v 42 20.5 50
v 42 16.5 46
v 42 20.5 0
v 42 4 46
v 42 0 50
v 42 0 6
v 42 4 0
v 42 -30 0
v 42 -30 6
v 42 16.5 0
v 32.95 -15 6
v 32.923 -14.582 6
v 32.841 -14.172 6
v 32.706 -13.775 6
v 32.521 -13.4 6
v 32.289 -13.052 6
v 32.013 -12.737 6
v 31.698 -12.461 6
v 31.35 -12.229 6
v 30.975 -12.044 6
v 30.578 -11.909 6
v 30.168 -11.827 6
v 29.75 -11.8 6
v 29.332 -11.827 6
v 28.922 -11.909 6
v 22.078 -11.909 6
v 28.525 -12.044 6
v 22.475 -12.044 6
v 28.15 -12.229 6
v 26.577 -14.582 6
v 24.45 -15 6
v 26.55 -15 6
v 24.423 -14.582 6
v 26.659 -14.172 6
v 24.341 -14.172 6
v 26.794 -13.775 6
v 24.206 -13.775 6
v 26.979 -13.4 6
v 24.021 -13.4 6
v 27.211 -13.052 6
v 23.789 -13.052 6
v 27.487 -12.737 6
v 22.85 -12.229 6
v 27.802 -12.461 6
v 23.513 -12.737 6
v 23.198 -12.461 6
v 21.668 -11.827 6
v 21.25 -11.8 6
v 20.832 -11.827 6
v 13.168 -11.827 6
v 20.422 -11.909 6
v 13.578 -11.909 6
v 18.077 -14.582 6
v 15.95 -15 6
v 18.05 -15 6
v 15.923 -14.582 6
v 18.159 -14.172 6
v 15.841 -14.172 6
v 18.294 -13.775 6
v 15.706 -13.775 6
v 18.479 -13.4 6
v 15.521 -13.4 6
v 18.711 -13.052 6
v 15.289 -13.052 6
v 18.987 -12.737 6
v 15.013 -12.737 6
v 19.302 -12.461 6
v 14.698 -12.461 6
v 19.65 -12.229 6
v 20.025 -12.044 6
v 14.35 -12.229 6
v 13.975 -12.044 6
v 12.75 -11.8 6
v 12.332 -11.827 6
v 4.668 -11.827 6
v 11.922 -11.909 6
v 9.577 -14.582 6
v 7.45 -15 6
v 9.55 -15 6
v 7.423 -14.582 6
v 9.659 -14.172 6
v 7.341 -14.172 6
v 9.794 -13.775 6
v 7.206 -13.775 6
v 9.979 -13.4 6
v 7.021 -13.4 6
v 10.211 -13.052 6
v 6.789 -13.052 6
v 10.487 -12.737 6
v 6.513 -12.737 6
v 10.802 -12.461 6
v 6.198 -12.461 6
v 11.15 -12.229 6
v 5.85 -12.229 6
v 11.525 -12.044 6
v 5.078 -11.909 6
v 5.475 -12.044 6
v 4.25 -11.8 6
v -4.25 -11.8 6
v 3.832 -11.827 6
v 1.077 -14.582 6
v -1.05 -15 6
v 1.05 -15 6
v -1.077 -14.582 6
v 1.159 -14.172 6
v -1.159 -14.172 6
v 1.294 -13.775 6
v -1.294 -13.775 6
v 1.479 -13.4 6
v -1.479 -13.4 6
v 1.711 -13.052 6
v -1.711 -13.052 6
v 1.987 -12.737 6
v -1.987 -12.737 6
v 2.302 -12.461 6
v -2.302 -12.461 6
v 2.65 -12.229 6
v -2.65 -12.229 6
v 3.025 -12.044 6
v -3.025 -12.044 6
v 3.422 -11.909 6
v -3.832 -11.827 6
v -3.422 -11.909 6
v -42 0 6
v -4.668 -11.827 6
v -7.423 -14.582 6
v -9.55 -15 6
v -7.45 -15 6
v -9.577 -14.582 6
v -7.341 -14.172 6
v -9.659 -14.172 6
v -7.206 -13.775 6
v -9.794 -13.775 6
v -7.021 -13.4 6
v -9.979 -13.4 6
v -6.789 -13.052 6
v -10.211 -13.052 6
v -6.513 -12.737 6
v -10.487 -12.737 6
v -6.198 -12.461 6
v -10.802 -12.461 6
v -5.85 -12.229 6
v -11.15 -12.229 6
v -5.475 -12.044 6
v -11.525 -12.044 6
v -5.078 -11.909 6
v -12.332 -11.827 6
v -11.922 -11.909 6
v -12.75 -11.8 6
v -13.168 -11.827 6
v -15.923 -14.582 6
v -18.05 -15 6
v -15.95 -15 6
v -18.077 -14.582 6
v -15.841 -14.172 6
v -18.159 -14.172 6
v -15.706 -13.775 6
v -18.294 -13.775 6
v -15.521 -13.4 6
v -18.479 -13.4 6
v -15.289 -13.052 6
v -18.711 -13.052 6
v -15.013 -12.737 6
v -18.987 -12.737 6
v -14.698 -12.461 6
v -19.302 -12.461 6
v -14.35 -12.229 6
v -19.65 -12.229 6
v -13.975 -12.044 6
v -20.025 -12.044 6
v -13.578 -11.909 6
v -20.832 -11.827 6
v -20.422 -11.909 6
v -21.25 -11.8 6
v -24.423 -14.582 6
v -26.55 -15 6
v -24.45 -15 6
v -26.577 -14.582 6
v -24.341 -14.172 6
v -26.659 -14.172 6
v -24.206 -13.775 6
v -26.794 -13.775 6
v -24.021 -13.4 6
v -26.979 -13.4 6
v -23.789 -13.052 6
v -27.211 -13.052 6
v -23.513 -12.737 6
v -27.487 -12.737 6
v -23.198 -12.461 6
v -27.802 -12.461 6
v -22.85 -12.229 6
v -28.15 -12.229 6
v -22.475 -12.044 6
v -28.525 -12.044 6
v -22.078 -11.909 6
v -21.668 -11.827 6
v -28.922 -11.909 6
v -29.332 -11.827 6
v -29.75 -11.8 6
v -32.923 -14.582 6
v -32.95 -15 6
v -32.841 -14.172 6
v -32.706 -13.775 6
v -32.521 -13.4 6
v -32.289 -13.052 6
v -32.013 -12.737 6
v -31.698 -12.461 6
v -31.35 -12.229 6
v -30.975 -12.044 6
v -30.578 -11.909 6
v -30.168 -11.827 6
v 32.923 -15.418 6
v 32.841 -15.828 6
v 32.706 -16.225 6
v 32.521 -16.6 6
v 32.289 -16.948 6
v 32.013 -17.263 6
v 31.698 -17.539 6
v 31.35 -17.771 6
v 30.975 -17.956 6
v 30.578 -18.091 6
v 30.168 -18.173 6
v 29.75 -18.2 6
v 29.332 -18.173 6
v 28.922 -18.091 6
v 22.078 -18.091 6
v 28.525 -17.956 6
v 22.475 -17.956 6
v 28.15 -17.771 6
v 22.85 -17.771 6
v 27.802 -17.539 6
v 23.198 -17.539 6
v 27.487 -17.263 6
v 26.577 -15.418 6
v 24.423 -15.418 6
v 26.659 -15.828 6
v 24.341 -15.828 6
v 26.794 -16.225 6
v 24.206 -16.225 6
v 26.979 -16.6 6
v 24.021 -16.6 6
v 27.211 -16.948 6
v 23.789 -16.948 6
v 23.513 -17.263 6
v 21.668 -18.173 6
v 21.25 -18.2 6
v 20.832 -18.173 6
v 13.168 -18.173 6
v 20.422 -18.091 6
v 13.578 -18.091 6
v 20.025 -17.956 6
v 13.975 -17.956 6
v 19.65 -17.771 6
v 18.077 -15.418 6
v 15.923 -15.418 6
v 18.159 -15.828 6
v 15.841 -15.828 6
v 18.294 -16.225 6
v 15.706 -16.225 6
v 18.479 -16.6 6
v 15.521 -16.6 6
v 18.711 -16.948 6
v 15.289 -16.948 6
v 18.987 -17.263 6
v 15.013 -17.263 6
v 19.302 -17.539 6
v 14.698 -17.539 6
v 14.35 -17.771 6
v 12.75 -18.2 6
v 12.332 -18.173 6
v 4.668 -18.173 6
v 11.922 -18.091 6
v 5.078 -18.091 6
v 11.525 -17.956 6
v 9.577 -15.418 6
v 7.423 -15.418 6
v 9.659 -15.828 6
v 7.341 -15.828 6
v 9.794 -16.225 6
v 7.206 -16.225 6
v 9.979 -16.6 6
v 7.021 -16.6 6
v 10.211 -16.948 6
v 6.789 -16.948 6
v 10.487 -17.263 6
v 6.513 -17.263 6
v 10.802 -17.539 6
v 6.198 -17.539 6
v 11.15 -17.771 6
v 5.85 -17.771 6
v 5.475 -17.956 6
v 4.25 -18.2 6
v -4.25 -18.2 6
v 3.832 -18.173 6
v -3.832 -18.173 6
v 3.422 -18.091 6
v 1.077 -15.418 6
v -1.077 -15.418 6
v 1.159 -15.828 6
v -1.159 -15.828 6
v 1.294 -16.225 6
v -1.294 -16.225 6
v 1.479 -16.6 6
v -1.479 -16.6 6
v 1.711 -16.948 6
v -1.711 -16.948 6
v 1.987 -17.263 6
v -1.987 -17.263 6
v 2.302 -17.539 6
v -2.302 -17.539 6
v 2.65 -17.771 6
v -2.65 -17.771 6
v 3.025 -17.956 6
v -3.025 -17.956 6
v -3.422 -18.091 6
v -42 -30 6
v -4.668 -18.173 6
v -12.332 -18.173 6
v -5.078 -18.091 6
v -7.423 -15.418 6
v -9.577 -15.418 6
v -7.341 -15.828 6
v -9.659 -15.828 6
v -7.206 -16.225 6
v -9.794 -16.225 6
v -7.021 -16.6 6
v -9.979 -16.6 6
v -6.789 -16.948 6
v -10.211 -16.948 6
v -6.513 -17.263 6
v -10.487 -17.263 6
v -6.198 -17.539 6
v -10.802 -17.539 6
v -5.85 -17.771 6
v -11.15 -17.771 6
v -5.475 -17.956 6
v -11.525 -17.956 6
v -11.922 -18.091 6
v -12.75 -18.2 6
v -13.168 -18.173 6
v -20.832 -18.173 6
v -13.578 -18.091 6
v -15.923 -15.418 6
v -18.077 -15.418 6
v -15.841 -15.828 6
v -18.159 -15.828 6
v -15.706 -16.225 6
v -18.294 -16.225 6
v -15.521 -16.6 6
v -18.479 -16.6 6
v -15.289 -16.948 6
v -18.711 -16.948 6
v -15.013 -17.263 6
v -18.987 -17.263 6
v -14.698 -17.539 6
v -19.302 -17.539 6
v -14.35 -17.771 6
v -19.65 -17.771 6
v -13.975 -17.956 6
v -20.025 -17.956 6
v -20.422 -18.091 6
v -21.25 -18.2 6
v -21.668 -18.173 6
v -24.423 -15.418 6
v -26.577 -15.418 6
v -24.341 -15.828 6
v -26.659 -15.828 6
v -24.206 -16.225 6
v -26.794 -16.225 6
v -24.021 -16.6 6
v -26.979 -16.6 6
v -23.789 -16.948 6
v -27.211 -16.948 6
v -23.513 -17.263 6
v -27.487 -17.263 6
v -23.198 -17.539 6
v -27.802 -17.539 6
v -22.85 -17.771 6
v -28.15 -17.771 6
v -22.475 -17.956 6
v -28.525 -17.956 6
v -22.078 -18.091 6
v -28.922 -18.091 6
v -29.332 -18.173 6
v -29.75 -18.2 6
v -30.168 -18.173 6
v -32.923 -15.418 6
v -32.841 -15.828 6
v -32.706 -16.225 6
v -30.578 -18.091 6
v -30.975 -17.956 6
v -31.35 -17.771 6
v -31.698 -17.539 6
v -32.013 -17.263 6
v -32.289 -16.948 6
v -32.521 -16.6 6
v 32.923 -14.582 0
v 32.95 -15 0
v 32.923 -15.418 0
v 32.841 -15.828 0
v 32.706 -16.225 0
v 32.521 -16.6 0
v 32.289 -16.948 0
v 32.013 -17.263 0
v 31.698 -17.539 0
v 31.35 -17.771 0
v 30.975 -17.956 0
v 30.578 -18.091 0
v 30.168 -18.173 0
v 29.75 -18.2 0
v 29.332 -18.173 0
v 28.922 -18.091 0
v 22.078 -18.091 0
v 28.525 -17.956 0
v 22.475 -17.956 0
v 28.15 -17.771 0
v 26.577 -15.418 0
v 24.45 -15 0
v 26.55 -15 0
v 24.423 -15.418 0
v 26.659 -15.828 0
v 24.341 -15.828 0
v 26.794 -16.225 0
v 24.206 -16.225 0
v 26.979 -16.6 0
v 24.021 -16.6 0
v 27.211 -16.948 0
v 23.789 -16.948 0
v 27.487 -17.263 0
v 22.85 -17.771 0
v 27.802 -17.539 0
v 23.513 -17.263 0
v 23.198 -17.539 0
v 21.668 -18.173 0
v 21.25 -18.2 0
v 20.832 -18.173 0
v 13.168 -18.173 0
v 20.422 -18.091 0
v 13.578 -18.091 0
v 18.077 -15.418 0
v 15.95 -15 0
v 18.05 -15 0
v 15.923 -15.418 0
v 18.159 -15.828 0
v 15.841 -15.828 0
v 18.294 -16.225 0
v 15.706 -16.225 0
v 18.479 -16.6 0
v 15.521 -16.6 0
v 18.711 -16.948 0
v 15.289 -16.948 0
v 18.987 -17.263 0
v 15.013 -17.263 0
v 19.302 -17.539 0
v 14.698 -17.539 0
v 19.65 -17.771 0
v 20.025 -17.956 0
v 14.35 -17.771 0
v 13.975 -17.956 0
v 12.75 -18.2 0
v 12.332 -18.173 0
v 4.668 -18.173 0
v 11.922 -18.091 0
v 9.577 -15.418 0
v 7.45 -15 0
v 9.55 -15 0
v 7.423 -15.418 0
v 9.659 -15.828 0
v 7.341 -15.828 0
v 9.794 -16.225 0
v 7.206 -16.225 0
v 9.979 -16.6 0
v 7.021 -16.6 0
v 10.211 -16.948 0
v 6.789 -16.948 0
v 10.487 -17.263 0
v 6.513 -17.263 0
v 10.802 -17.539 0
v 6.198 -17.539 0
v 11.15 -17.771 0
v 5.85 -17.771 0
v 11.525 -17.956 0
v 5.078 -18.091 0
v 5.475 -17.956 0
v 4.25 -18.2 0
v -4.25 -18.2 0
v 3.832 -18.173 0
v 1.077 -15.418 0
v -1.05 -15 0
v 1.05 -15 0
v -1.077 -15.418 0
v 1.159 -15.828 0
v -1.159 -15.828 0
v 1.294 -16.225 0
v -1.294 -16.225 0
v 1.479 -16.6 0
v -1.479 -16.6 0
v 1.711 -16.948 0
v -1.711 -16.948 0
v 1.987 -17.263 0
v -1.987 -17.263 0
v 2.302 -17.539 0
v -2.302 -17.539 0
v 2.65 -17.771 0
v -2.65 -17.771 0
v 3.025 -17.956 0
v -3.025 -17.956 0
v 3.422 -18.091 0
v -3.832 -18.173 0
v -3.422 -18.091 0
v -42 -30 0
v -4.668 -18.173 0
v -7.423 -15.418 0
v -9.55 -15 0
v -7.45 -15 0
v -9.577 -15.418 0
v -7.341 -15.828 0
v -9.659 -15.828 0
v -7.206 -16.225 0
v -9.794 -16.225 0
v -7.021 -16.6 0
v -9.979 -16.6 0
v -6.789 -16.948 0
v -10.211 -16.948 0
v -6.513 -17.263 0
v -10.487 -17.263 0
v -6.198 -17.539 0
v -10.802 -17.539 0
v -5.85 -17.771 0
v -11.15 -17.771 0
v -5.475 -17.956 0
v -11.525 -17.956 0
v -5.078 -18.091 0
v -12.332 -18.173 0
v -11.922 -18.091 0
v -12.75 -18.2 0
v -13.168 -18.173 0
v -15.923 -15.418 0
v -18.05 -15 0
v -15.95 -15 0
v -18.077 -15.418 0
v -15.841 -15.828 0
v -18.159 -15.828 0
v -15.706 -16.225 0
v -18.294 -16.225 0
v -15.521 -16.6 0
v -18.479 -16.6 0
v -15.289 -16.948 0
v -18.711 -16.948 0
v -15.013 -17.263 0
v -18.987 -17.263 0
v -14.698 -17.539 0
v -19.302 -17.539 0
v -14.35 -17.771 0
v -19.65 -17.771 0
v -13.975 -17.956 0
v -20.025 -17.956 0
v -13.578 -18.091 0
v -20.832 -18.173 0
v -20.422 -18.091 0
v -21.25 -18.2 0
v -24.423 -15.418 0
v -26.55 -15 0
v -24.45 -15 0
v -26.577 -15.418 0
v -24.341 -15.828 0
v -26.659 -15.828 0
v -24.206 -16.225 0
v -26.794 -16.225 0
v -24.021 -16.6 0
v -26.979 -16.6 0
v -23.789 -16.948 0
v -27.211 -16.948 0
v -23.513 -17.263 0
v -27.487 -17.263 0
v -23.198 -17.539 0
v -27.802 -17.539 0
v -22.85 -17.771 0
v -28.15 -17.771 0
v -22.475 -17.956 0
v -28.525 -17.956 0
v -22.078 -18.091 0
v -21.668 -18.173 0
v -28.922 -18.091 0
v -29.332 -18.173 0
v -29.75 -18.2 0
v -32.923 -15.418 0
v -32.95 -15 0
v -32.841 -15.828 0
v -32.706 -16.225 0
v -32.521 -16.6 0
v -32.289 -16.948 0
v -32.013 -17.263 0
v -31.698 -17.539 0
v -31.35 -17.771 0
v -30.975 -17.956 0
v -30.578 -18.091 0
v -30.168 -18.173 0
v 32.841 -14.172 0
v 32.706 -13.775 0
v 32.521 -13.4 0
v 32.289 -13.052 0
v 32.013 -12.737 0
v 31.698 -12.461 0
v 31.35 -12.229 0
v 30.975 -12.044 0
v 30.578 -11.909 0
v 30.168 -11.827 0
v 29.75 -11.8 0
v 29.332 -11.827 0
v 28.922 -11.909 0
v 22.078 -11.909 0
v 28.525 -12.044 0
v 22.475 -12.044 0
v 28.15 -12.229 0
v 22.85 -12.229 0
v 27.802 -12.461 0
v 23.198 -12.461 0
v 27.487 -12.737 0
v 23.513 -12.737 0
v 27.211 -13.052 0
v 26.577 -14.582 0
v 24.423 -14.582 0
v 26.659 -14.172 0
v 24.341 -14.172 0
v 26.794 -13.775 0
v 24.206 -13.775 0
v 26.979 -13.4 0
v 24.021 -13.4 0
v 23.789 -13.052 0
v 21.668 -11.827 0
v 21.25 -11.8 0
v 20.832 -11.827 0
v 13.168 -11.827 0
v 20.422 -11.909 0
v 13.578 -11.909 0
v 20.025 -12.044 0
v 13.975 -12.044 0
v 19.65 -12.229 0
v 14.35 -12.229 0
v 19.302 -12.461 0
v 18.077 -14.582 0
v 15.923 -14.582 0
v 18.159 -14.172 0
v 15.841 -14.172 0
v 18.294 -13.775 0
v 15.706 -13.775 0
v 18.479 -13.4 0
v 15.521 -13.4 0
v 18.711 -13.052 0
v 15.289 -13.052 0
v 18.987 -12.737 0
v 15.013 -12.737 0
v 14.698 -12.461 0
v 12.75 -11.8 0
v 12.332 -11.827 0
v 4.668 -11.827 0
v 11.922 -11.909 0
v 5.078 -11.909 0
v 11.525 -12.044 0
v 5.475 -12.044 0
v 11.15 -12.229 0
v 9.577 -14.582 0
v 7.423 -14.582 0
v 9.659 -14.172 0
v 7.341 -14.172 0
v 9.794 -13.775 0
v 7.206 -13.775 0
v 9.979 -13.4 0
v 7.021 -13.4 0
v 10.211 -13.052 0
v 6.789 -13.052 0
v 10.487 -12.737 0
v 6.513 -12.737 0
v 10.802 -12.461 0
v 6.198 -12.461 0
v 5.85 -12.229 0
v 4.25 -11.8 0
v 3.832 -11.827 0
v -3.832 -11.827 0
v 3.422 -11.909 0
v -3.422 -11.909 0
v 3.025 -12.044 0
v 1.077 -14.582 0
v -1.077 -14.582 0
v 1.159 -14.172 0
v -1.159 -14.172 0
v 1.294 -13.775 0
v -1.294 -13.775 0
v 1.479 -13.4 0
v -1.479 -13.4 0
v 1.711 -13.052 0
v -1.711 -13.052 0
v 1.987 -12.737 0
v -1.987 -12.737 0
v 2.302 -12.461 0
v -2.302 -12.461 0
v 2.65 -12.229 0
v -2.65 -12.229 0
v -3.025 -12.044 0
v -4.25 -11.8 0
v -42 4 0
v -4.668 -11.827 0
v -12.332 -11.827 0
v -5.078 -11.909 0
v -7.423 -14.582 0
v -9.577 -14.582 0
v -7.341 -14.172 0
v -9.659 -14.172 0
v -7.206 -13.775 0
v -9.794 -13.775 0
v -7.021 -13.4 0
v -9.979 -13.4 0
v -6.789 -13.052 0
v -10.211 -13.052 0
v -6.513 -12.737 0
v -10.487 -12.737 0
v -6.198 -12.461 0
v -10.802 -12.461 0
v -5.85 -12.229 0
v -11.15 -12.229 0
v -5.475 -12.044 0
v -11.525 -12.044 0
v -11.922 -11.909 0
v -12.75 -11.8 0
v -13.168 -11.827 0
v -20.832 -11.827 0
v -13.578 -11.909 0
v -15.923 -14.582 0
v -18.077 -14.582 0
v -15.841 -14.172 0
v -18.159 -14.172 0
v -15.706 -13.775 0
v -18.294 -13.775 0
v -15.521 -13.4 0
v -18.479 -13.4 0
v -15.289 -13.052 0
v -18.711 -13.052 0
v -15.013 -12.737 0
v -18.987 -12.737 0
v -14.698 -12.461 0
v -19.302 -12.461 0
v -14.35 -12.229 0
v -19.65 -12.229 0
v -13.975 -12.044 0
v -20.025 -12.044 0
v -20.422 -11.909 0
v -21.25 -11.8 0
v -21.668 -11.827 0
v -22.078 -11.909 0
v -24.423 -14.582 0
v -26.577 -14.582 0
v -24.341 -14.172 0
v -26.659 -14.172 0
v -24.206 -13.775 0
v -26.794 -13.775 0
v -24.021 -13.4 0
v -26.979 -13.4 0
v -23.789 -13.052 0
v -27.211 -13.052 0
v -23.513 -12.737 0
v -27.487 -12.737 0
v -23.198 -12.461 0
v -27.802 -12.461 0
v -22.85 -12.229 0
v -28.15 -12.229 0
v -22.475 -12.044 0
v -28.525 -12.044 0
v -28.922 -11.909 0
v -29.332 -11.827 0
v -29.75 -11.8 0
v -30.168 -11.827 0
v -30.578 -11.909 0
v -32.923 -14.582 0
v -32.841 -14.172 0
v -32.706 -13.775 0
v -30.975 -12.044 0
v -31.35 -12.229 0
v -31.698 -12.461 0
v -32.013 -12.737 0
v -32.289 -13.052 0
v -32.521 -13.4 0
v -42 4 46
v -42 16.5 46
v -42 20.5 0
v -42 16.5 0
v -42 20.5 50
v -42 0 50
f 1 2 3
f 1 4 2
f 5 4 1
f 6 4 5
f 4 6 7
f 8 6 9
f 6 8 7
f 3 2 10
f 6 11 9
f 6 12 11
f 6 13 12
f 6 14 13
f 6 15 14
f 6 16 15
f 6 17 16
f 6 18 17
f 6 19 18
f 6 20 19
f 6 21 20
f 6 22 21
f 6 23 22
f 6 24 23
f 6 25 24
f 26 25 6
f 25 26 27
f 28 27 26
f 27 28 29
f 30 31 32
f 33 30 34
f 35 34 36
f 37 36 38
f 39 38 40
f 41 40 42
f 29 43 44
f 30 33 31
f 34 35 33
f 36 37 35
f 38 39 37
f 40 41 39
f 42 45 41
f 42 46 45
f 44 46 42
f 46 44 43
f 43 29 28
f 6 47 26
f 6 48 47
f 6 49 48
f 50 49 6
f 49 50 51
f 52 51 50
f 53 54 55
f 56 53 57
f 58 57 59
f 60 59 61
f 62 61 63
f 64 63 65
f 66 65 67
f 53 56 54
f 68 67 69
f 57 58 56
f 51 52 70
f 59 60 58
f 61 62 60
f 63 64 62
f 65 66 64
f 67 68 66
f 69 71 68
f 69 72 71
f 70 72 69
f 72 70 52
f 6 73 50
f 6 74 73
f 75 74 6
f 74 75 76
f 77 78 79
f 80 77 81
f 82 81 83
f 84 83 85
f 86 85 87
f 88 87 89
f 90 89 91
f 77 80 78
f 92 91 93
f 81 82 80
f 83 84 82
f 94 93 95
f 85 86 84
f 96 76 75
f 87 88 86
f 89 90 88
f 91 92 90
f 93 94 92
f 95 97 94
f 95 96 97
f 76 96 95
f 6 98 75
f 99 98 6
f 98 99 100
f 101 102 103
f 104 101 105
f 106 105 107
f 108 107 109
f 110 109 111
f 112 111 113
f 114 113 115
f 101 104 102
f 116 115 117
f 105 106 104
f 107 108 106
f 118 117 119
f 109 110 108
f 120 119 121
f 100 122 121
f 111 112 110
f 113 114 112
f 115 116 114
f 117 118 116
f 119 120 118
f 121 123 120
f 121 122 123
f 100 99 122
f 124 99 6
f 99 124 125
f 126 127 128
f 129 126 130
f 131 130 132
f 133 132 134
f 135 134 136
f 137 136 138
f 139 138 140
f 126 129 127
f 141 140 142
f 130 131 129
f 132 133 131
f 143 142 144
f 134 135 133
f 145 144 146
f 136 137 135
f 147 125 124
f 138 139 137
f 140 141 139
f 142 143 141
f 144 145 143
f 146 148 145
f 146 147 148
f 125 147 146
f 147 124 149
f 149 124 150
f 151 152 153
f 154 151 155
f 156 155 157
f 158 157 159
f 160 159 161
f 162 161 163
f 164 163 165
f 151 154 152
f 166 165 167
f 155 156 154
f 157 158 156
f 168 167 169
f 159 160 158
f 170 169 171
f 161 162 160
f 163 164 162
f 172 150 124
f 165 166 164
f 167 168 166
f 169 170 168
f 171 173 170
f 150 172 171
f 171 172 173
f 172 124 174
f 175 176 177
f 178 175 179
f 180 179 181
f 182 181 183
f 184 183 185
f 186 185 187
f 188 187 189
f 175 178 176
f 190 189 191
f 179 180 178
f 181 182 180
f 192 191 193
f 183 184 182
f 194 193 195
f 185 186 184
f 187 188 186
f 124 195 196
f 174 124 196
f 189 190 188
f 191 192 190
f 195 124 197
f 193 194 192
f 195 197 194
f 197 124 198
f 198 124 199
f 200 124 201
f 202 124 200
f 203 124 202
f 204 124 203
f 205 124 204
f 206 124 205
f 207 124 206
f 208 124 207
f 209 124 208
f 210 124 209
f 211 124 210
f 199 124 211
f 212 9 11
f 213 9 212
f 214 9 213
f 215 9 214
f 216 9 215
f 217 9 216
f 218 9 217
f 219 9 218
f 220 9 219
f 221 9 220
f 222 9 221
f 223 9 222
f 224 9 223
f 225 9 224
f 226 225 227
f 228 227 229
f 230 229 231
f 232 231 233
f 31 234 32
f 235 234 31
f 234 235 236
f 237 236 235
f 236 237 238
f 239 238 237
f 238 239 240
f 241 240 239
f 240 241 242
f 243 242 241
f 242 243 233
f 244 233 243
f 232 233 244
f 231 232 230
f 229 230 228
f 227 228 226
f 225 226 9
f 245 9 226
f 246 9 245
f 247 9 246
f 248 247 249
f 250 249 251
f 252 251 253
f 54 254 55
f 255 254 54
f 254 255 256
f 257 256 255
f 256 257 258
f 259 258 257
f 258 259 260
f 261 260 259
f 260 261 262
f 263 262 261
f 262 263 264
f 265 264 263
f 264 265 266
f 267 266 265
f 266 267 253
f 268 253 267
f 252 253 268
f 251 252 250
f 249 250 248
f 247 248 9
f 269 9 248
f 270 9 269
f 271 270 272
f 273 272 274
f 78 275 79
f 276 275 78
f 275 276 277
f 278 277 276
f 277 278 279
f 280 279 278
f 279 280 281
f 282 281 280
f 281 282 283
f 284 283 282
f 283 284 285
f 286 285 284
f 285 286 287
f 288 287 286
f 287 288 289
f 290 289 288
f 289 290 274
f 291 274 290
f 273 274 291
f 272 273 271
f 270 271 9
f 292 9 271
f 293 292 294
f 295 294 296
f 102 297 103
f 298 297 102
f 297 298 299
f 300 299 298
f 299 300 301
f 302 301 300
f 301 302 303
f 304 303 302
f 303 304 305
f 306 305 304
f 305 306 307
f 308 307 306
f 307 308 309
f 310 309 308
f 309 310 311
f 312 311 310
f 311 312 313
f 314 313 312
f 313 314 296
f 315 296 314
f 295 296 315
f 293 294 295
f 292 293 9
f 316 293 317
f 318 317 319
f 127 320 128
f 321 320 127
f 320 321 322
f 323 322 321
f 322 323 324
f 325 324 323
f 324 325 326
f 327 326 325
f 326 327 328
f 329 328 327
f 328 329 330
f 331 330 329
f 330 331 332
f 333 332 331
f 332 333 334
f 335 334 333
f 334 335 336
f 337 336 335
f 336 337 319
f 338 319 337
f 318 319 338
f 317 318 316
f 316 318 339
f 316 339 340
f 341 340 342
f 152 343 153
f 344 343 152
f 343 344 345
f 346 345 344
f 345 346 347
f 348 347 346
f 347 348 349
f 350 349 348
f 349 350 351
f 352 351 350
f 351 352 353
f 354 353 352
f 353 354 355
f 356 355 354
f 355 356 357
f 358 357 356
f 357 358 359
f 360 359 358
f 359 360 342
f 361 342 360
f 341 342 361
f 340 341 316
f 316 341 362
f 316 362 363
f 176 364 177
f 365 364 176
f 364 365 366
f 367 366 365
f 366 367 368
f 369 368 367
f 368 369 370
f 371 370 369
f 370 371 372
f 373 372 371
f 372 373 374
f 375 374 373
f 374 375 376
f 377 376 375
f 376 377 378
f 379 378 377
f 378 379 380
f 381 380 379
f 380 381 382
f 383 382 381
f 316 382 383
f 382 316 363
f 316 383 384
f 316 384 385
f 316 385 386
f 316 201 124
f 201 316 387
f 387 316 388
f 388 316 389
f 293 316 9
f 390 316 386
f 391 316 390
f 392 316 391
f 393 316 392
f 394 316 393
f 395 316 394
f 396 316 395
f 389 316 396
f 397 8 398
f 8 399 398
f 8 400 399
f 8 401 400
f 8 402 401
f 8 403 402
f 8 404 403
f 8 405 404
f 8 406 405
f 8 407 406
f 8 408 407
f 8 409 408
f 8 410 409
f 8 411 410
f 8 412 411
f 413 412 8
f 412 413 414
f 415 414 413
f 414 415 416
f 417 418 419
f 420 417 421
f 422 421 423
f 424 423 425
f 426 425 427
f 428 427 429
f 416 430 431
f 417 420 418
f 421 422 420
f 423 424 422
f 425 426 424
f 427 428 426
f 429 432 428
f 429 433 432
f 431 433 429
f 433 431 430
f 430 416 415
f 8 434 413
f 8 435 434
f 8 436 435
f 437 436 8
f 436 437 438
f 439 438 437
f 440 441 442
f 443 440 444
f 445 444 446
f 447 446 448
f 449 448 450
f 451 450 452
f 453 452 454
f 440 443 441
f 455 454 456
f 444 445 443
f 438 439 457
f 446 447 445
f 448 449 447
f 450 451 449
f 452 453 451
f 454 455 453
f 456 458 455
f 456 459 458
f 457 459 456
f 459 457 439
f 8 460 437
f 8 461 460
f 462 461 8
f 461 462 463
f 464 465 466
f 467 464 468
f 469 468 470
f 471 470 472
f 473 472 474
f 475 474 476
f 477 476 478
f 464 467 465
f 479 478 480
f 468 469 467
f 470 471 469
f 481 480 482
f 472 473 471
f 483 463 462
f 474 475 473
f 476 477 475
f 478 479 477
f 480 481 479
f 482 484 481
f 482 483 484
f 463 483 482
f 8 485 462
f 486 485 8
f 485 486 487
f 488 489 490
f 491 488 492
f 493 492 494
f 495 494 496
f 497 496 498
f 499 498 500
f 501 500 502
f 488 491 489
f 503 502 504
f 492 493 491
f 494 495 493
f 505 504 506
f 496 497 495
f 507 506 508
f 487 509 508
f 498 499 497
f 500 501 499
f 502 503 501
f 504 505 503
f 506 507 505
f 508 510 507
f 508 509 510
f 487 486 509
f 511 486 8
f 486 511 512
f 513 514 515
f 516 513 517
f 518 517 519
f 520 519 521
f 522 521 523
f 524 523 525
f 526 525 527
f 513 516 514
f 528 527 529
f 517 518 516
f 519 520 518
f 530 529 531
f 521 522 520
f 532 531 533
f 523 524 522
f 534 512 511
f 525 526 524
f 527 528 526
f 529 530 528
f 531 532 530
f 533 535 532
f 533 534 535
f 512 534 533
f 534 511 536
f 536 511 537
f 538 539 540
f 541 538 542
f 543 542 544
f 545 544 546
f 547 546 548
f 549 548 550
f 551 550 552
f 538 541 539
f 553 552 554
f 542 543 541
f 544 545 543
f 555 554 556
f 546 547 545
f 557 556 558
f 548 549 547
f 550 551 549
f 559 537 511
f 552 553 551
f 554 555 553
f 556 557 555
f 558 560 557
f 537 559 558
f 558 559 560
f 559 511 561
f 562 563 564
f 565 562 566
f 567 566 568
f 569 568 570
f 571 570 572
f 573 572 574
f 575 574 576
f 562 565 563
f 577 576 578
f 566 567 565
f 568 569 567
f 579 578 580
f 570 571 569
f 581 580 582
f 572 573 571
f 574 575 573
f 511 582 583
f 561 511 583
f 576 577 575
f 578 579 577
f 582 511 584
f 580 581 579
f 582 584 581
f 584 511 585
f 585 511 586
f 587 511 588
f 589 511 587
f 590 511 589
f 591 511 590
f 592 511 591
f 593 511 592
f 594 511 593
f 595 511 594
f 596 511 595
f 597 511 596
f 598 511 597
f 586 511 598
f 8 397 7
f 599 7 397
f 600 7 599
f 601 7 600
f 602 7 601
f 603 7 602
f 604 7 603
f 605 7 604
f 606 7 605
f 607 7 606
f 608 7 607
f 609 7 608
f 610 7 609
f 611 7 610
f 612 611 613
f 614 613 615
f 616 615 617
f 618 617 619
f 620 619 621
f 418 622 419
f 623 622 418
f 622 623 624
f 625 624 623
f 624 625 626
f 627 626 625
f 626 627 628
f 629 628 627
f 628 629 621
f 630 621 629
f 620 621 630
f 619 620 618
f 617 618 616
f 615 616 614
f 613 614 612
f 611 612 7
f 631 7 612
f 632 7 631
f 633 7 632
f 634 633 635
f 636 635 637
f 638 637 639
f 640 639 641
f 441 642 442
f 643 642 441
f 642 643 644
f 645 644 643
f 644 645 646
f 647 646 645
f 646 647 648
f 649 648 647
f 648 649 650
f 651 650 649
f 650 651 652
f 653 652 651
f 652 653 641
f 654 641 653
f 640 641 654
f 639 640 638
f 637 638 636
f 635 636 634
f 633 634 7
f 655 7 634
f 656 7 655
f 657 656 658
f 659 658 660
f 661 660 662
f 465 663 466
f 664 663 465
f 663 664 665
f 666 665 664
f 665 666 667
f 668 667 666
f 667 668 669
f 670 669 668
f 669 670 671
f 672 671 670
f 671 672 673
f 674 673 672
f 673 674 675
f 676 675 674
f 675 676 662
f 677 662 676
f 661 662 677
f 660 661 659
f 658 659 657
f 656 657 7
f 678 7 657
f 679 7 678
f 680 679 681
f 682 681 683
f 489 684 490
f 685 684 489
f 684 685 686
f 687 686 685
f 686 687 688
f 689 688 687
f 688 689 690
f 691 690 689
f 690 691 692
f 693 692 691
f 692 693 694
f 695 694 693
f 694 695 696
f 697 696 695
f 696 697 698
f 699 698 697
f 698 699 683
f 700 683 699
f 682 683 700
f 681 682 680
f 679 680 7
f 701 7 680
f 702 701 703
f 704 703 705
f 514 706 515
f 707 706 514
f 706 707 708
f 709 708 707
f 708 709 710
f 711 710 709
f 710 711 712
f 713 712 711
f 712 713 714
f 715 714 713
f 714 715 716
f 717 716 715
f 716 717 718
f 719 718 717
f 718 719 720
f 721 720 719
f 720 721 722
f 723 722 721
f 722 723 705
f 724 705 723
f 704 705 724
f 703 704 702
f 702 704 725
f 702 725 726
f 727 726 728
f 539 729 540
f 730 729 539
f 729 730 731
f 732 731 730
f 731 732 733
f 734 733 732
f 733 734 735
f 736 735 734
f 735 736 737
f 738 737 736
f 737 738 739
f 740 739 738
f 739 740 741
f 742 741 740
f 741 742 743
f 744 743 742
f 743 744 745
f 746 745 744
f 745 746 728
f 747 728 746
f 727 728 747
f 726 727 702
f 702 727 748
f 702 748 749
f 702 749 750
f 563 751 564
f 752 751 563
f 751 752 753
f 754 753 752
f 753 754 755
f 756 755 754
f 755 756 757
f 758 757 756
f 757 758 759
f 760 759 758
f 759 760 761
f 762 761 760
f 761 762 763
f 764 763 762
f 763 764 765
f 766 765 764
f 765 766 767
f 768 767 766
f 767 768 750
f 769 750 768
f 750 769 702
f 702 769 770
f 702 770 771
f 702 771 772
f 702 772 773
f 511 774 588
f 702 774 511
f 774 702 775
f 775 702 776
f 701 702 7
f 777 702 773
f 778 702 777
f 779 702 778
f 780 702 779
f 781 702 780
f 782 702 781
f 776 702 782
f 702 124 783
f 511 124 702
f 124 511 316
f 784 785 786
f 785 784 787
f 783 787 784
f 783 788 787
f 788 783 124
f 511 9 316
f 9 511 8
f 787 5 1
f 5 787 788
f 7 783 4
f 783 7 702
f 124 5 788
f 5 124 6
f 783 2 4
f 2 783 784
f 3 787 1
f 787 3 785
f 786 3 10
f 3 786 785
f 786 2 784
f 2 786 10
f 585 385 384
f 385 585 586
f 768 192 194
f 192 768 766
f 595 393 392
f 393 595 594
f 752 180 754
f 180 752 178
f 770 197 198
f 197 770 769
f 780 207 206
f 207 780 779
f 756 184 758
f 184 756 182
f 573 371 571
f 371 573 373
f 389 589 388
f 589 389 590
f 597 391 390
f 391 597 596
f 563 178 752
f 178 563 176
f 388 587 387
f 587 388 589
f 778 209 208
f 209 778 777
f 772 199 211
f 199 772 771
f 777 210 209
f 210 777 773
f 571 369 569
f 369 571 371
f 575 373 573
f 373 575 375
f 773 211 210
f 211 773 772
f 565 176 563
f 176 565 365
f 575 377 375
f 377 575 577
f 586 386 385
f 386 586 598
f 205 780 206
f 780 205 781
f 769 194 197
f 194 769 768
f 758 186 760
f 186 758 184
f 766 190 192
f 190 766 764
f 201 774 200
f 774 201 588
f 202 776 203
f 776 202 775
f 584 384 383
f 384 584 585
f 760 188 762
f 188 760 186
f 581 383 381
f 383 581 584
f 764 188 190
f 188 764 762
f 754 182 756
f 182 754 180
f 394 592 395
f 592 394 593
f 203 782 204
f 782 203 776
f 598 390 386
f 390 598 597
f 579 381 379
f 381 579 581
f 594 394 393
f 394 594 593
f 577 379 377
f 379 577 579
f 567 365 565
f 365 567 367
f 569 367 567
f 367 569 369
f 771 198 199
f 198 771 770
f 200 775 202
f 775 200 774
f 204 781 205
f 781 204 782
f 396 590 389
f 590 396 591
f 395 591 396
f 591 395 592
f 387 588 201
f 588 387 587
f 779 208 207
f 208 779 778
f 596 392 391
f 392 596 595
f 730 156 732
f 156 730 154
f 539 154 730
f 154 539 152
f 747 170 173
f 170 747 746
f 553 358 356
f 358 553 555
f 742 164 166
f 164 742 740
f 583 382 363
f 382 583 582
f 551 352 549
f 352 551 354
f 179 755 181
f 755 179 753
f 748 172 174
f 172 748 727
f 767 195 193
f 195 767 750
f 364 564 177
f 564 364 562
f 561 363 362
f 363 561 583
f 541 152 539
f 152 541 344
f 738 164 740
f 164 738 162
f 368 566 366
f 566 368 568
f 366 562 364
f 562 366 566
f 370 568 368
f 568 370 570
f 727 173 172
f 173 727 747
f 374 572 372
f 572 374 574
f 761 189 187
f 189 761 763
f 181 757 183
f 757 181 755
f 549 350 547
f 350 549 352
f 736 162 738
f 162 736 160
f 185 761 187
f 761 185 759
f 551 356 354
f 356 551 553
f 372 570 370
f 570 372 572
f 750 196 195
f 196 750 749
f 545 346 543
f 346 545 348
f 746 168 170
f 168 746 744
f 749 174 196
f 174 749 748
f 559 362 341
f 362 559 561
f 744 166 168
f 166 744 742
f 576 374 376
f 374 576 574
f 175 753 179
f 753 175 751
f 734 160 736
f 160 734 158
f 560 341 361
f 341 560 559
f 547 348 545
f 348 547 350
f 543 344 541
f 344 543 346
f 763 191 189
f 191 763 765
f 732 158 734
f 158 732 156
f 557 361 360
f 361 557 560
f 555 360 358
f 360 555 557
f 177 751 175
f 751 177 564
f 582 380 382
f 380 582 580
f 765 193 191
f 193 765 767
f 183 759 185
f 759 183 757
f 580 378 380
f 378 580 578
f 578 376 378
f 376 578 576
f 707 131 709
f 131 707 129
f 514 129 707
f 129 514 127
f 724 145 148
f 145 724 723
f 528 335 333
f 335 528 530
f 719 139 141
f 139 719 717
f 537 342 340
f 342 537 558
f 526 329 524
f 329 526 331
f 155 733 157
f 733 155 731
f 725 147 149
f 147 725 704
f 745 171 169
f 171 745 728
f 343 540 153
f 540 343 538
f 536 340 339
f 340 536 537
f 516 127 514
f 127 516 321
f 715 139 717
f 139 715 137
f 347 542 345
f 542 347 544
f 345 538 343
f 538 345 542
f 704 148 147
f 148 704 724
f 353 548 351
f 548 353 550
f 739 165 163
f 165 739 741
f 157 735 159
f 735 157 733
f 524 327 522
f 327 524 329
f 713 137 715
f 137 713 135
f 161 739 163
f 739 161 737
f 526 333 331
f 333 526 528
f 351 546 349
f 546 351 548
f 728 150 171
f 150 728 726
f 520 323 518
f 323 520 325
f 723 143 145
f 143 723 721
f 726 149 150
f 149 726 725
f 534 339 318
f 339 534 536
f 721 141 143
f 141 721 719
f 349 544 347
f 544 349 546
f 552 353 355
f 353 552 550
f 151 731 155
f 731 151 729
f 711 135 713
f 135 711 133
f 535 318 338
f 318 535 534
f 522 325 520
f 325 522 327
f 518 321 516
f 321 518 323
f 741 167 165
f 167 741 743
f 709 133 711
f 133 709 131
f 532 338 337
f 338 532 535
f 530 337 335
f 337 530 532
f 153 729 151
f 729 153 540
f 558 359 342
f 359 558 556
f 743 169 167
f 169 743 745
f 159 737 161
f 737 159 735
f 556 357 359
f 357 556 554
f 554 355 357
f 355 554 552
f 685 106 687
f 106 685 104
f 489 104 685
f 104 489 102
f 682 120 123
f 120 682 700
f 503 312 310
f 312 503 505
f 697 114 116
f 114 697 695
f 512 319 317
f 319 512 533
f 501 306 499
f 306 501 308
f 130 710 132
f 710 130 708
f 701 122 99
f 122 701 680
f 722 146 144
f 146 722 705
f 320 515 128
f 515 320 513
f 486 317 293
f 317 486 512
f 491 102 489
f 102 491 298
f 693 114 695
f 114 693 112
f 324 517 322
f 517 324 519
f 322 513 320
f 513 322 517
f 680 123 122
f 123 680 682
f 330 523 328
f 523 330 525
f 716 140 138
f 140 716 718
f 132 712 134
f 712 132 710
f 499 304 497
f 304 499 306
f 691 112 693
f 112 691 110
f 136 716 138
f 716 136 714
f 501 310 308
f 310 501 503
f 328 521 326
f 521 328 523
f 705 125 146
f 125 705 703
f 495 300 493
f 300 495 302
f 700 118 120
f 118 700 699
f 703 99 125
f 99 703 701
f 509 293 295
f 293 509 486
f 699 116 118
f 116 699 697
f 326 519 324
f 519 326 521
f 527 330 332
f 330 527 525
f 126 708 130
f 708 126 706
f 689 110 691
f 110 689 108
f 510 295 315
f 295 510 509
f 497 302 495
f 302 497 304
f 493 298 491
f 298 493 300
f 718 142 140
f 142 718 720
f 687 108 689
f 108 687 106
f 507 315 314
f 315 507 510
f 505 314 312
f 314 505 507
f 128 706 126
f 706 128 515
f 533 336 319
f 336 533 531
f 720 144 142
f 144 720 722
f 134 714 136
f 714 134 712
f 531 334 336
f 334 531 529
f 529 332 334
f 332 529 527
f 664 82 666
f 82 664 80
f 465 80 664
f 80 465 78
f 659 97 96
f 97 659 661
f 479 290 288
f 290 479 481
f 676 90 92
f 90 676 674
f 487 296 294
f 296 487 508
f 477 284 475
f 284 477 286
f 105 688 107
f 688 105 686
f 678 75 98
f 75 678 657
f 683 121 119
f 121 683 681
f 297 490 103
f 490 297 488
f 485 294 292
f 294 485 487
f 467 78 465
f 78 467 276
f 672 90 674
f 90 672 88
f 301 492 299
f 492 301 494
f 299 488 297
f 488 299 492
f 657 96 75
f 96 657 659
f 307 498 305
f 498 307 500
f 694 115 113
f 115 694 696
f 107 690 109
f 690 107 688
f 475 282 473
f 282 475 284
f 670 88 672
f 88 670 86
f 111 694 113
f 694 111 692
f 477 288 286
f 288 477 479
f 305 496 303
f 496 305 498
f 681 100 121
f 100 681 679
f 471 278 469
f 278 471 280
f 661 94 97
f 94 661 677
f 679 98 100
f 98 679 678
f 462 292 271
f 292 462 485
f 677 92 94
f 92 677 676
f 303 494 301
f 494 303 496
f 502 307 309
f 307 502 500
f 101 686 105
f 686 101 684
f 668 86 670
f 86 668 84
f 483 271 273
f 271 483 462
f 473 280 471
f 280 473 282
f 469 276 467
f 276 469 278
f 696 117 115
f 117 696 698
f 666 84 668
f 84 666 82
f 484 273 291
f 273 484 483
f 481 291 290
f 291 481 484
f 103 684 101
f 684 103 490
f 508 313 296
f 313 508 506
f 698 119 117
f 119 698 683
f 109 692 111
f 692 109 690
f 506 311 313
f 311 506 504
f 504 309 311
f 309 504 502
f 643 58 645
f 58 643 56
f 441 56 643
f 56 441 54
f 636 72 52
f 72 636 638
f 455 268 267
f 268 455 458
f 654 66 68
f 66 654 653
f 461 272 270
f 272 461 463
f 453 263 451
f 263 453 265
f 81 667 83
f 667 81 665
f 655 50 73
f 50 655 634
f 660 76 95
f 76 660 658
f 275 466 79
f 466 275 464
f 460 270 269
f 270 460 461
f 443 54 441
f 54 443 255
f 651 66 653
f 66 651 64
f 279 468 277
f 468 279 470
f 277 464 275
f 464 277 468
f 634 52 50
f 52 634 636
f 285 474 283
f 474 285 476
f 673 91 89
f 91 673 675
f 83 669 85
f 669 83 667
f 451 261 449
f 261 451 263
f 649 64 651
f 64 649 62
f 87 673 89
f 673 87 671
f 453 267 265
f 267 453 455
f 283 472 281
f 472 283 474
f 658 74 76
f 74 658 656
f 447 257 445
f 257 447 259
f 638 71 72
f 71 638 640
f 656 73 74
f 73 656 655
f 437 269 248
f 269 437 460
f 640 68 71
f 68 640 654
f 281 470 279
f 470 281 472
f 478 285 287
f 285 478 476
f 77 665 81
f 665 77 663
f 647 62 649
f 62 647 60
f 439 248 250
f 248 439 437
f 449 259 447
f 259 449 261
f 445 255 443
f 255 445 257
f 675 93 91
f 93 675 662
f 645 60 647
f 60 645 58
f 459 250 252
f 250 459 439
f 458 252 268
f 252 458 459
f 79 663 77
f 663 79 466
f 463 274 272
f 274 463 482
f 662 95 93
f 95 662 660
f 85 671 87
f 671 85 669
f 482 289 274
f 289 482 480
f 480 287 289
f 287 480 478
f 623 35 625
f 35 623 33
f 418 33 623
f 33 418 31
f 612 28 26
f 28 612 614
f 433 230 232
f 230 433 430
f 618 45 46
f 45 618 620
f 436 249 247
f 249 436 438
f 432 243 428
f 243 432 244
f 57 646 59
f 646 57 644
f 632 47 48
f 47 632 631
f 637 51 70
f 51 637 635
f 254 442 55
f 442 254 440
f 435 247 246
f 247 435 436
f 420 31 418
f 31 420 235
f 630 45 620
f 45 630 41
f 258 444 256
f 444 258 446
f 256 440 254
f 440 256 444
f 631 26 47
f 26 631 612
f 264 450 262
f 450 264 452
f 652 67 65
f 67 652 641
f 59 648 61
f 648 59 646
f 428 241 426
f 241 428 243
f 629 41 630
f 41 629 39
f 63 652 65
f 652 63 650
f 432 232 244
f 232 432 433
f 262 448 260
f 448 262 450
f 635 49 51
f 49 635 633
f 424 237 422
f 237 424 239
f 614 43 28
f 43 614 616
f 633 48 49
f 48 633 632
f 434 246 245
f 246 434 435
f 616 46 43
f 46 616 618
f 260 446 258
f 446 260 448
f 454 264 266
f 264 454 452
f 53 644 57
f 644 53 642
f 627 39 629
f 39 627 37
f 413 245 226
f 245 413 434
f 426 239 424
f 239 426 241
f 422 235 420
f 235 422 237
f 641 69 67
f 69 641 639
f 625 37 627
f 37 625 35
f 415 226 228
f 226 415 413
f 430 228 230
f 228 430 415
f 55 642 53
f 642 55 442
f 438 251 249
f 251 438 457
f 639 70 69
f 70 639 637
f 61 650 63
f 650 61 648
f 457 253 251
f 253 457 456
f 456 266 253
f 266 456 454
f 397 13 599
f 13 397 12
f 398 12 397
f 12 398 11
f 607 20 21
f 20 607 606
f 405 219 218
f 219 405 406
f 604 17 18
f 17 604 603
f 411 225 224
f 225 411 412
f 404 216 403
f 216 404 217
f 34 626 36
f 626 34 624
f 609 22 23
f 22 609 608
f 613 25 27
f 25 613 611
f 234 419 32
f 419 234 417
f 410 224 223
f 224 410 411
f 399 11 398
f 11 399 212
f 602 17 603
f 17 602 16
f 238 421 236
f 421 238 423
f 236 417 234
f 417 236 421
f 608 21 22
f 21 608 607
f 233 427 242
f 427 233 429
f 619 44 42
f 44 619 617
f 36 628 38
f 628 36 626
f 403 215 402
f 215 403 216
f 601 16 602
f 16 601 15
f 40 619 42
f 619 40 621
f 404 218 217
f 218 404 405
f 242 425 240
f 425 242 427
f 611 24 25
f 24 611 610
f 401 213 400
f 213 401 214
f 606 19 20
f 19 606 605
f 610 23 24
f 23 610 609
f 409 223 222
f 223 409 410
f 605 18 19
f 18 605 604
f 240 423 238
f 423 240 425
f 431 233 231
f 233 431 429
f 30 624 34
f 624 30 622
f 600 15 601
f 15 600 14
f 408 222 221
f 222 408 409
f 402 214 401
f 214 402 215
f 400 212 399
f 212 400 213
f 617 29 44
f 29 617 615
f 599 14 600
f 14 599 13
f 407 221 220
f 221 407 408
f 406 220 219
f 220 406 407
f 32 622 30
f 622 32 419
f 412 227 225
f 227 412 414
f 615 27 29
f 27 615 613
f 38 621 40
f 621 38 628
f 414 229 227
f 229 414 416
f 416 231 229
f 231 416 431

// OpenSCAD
// KNOWN-WRONG PART (must fail): the holes are 8.5 mm apart instead of 9
// Holder that hangs one 8-tube PCR strip inside an ice bucket, hooked over its 12 mm wall
// Category: quick fixes. An upside-down U (two legs and a bridge) that fits over the wall, and a
// ledge at the foot of the inner leg with eight tube holes, so the tubes sit down in the ice.
// Print: PLA or PETG, as used (both legs and the ledge on the bed); the bridge spans 12.5 mm.
// SPDX-License-Identifier: CERN-OHL-P-2.0

/* [Hanger] */
length = 84;              // along X, centred
leg_t = 4;
gap = 12.5;               // 12 mm bucket wall + clearance
leg_h = 50;               // both legs from z = 0 to 50
bridge_t = 4;             // bridge from z = 46 to 50
ledge = [30, 6];          // ledge reaches 30 mm toward -Y, 6 mm thick
hole_d = 6.4;
n = 8;
pitch = 8.5;
hole_y = -15;

/* [Hidden] */
eps = 0.01;
outer_y = leg_t + gap;    // outer leg from y = 16.5 to 20.5

difference() {
    union() {
        translate([-length / 2, -ledge[0], 0]) cube([length, ledge[0] + eps, ledge[1]]);
        translate([-length / 2, 0, 0]) cube([length, leg_t, leg_h]);
        translate([-length / 2, 0, leg_h - bridge_t]) cube([length, outer_y + leg_t, bridge_t]);
        translate([-length / 2, outer_y, 0]) cube([length, leg_t, leg_h]);
    }
    for (i = [0 : n - 1])
        translate([(i - (n - 1) / 2) * pitch, hole_y, -1]) cylinder(d = hole_d, h = ledge[1] + 2, $fn = 48);
}
